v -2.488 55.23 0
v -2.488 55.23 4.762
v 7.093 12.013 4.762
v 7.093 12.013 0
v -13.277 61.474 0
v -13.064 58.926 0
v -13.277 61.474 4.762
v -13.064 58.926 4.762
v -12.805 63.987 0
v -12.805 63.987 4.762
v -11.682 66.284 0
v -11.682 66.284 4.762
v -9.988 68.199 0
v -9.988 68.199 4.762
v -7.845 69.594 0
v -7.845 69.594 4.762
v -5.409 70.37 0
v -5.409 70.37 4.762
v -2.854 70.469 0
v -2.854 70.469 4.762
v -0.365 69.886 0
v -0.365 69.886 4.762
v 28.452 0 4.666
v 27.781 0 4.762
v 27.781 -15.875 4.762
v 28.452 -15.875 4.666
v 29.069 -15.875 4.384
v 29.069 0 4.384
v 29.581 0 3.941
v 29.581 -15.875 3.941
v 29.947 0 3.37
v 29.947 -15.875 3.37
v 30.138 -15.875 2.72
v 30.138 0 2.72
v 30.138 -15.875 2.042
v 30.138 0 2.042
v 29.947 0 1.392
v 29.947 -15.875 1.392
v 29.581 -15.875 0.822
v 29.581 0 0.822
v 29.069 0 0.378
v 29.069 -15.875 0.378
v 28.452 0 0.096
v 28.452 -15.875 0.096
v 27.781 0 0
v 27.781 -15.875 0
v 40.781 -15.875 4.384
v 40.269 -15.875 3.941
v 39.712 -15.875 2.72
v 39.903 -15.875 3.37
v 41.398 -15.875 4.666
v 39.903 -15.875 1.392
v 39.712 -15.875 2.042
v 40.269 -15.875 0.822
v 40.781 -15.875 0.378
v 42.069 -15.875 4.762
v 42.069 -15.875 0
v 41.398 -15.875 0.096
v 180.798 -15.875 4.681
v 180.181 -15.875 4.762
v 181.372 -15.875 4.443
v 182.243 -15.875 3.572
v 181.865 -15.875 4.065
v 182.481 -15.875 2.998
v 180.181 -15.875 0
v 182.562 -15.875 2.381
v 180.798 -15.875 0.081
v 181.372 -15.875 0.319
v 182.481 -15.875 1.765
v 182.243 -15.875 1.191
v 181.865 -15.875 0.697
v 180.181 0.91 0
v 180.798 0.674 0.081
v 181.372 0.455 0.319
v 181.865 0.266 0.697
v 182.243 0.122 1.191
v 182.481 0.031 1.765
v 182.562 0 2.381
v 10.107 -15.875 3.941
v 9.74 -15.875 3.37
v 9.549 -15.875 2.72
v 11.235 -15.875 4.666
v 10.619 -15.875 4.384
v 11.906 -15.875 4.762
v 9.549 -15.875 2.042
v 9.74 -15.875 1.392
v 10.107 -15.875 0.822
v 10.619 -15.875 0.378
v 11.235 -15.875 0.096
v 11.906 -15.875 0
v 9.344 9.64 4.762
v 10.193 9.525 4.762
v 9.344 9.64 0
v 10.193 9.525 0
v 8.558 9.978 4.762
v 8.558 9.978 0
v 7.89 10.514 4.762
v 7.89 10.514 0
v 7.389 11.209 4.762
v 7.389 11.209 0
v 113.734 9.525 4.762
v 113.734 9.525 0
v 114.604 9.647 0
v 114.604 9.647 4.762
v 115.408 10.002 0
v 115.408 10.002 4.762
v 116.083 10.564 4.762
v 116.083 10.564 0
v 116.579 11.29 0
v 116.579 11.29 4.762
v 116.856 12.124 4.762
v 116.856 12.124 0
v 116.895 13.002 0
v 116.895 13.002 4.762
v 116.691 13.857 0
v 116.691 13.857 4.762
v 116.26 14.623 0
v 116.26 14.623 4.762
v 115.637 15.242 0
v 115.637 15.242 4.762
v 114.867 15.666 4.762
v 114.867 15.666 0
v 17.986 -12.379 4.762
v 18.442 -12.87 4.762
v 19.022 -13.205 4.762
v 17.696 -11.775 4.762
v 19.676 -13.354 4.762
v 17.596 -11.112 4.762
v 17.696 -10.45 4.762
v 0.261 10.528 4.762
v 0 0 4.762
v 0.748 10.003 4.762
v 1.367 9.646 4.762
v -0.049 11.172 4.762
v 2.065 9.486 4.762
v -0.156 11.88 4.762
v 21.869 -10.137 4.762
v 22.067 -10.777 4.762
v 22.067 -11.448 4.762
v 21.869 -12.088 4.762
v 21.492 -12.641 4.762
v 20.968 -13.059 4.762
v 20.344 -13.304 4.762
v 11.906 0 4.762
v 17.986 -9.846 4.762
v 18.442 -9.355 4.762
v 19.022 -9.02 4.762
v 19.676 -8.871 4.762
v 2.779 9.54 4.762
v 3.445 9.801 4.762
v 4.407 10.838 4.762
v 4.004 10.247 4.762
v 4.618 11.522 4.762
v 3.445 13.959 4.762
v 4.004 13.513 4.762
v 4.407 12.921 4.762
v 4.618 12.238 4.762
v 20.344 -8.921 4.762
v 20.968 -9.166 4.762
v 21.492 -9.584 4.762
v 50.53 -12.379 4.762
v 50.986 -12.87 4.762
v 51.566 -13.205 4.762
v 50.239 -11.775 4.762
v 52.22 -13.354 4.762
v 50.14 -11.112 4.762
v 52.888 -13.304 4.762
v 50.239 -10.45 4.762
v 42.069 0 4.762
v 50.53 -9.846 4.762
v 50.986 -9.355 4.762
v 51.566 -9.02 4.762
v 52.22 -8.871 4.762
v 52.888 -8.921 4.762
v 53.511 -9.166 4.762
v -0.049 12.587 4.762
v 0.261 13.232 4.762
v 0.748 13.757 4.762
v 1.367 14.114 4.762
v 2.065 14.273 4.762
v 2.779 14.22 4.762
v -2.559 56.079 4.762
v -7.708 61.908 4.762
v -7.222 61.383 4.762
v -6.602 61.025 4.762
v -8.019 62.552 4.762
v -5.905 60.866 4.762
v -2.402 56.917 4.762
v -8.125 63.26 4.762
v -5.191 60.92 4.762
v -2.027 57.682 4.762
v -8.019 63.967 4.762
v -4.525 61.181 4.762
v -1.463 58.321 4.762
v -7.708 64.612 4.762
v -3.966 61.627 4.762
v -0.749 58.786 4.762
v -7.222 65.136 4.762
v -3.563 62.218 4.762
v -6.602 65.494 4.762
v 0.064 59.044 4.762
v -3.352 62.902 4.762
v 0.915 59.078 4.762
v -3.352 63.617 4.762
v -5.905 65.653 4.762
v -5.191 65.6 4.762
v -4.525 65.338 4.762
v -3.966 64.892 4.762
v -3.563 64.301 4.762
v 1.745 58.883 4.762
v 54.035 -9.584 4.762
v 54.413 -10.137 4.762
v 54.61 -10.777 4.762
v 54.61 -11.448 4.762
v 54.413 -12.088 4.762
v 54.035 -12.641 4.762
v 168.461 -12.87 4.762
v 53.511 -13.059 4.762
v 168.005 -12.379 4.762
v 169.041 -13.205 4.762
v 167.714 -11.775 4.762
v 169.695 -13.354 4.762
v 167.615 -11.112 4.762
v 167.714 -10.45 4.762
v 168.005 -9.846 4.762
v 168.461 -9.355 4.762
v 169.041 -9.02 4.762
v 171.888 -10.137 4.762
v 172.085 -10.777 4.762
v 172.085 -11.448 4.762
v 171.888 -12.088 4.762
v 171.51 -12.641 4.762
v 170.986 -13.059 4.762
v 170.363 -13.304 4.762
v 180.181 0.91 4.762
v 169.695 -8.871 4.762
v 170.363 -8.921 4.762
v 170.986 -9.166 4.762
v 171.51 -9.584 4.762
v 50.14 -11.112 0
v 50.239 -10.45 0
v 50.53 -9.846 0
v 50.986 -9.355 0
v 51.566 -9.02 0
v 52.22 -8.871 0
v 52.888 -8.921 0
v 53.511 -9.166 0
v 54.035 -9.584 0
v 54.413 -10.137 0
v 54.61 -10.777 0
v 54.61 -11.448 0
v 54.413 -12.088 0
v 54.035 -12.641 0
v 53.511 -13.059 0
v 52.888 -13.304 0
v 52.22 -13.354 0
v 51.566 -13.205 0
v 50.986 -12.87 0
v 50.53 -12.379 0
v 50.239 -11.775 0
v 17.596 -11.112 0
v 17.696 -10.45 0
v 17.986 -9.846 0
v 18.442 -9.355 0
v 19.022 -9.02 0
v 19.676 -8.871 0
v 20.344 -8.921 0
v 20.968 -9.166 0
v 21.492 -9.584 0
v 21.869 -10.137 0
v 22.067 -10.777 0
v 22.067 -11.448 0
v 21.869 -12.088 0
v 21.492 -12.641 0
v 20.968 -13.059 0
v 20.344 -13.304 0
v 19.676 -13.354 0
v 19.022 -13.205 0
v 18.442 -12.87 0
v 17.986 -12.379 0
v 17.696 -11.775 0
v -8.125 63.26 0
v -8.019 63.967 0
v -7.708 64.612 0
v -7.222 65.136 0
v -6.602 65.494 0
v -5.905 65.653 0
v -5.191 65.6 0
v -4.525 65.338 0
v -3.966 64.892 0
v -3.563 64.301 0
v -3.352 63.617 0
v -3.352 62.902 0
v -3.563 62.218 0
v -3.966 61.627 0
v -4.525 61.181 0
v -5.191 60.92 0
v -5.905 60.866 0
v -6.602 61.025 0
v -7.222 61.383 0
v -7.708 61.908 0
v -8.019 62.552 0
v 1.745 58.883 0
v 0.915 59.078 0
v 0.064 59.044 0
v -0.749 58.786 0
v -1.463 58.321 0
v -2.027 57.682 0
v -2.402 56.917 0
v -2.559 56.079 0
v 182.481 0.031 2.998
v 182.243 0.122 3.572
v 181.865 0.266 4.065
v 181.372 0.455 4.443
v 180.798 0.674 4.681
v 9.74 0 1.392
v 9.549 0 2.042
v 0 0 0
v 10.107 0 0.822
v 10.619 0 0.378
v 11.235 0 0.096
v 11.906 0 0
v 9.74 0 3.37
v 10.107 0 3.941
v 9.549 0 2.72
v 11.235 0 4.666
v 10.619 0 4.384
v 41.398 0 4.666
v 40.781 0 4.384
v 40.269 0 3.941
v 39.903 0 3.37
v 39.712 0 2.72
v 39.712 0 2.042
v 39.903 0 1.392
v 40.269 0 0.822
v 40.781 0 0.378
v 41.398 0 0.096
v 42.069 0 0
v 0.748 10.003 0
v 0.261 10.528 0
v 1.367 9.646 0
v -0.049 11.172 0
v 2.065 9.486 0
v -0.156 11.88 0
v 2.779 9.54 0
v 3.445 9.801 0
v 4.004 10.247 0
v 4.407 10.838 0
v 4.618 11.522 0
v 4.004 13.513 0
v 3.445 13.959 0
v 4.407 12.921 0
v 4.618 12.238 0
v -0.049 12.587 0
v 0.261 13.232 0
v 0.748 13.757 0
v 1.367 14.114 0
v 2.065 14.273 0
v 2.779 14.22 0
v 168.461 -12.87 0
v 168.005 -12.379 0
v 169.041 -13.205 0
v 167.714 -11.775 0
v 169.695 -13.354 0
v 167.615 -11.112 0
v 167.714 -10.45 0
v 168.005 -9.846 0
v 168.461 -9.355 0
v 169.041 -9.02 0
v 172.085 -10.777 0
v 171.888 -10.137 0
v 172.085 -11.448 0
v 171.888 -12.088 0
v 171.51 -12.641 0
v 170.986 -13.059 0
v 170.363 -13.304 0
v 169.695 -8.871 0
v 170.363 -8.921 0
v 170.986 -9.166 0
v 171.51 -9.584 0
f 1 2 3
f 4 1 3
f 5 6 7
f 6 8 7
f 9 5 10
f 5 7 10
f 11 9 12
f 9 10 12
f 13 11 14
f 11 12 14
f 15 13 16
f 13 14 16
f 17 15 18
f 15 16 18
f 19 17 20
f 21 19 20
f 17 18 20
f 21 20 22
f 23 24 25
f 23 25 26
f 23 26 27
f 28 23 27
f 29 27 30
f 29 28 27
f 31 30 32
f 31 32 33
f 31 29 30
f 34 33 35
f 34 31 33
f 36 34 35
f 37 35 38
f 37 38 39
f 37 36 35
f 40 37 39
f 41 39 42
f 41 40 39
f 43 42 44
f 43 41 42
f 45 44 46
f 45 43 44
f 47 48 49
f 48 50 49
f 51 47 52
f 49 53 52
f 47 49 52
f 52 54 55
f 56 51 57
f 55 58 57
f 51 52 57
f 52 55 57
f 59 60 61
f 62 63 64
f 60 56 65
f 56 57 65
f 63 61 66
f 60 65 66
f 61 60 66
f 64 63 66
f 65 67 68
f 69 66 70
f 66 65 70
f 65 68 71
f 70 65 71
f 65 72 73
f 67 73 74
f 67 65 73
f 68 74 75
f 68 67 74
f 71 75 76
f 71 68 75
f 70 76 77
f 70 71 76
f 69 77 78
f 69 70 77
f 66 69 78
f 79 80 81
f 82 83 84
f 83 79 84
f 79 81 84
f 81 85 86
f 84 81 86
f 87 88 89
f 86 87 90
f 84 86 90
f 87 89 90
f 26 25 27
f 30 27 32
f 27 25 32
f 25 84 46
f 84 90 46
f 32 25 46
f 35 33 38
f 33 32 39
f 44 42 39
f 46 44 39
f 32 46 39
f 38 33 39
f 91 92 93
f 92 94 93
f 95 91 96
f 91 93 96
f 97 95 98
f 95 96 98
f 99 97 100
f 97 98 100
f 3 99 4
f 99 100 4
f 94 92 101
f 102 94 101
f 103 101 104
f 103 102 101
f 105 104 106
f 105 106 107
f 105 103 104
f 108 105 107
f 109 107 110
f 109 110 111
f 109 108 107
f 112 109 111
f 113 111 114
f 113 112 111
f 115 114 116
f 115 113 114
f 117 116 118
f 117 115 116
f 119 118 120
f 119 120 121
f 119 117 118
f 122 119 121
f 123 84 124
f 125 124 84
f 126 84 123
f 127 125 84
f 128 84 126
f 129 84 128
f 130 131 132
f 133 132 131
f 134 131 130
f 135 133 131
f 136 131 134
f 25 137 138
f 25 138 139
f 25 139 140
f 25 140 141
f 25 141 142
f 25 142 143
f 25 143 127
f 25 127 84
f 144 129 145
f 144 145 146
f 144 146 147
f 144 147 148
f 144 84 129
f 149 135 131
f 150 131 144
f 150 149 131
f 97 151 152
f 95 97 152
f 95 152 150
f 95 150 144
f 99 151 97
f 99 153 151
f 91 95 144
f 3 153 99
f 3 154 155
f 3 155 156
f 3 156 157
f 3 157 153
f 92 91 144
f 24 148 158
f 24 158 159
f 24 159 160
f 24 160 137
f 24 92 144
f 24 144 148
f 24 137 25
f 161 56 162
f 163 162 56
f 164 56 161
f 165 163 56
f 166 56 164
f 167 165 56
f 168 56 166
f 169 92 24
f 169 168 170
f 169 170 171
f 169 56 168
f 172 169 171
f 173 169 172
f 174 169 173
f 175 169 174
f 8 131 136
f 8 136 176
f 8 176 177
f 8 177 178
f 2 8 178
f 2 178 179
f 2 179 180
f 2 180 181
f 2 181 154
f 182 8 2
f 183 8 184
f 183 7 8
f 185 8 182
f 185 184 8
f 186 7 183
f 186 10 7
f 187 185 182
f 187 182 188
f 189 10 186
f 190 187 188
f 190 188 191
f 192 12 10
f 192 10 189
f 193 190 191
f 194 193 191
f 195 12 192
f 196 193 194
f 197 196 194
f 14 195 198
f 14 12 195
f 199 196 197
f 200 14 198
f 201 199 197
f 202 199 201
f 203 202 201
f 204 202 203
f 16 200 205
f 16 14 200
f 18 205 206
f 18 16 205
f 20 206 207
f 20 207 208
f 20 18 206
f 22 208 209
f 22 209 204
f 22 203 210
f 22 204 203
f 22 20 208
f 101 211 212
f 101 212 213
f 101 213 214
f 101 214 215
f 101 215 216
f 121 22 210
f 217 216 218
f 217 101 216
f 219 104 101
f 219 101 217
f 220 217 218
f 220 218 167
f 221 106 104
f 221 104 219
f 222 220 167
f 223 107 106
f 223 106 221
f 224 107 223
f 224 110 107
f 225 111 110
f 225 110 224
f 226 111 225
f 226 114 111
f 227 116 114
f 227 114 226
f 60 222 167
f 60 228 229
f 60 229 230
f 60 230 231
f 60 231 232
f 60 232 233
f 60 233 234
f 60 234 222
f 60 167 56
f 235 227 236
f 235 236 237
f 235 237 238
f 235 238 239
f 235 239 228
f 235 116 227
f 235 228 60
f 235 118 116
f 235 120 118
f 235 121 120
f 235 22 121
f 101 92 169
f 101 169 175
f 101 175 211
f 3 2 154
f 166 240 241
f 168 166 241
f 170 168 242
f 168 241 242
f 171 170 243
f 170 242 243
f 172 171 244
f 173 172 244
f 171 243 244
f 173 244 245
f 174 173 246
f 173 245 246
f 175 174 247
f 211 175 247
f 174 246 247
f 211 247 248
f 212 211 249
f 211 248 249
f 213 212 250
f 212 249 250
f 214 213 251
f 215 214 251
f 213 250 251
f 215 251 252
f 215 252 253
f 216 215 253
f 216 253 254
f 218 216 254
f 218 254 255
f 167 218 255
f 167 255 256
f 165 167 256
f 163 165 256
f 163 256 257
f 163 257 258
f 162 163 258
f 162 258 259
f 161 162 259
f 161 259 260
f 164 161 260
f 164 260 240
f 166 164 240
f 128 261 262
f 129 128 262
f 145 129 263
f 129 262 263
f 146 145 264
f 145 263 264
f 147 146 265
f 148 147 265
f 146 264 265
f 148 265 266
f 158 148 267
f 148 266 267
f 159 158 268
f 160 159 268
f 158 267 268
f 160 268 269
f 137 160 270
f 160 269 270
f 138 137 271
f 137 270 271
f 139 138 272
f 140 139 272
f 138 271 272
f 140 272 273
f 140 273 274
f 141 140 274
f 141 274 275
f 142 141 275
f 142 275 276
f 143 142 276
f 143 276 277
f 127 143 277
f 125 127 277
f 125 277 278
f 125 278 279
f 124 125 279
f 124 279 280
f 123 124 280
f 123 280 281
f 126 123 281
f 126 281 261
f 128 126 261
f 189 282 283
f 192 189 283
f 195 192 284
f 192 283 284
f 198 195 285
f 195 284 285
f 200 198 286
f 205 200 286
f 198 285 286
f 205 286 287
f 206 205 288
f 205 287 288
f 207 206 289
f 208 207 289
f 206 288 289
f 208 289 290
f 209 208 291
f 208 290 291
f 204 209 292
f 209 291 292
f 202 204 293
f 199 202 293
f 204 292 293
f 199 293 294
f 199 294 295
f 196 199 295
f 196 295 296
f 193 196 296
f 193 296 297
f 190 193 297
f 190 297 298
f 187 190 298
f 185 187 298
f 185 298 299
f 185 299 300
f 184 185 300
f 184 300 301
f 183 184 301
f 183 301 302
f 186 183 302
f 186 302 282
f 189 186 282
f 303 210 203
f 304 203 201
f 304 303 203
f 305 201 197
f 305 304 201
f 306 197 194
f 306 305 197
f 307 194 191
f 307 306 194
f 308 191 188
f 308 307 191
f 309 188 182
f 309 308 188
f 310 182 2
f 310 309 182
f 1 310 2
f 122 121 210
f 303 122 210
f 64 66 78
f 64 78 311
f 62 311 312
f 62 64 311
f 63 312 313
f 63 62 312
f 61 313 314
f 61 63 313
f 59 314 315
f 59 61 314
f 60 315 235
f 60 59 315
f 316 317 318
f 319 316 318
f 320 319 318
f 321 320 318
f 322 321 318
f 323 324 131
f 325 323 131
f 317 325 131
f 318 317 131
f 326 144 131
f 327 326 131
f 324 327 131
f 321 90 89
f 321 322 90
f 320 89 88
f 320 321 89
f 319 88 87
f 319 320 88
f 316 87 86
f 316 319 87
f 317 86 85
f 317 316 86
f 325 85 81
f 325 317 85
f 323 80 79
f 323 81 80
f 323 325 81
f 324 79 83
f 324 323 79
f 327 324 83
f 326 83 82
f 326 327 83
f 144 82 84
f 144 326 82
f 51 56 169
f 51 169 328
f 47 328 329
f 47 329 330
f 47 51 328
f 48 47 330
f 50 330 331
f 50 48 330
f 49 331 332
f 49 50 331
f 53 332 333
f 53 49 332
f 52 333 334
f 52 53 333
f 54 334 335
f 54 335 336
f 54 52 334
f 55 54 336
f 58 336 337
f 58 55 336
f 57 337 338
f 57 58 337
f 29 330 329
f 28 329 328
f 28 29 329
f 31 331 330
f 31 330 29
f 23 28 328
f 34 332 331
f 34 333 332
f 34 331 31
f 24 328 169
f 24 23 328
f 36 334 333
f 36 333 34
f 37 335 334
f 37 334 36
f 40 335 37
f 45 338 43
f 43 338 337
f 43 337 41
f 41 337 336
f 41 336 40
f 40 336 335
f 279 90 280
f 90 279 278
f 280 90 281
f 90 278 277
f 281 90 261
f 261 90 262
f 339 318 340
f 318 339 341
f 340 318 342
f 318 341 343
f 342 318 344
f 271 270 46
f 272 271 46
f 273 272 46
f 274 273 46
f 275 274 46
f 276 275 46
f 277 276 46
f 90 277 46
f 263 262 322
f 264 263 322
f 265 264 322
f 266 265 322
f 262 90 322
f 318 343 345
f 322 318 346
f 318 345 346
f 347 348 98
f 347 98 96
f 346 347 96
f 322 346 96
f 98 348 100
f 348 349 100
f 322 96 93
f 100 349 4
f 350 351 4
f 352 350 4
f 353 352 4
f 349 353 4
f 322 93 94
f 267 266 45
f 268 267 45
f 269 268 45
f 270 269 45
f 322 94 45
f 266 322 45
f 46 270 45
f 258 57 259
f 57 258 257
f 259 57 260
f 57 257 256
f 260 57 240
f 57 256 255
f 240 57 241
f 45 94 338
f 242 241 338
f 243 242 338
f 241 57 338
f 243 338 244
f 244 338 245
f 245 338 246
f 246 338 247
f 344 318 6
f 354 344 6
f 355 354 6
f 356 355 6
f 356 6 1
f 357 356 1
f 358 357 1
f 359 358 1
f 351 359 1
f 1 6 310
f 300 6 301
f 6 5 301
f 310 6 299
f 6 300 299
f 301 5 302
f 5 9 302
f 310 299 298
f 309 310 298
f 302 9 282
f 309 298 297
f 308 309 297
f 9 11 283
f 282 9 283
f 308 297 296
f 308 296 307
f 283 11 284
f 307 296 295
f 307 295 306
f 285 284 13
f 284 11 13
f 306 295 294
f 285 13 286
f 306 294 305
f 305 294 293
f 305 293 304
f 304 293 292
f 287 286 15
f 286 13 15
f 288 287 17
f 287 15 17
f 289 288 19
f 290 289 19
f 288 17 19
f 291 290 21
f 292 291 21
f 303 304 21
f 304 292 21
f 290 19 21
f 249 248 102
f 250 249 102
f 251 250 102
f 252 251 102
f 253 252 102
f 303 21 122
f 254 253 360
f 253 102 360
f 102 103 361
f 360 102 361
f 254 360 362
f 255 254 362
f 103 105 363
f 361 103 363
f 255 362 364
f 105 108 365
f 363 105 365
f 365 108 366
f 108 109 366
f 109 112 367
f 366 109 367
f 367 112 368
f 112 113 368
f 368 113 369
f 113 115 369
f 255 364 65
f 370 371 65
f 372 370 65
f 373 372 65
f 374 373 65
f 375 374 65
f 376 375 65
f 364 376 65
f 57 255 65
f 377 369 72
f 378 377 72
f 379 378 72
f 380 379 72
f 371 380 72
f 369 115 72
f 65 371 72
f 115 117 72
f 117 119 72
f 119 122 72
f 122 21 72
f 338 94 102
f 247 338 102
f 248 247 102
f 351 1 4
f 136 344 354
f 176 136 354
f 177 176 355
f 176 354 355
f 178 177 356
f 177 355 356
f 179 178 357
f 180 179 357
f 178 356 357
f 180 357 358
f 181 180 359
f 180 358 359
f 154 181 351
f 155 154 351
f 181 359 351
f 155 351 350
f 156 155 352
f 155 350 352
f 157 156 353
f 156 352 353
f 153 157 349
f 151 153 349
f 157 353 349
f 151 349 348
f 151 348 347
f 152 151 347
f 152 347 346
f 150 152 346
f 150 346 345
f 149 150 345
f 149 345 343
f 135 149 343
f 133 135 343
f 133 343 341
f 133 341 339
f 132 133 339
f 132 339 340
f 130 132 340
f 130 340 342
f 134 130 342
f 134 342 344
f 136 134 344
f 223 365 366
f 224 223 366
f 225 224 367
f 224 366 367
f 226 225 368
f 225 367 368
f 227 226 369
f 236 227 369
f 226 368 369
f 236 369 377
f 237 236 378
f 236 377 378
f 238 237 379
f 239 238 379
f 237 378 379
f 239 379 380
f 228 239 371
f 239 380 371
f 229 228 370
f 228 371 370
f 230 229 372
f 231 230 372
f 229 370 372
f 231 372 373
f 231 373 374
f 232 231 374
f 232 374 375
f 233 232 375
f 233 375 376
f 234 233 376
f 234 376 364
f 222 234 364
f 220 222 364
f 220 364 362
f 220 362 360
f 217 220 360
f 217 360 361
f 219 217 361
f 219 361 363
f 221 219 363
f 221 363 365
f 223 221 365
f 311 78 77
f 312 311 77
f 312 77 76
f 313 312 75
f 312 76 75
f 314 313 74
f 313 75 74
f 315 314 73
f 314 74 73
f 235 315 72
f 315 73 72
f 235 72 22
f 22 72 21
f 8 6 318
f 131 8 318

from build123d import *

# Parameters (mm, degrees)
BOSS_EXTRUDE1_DEPTH         = 4.7625
CUT_EXTRUDE1_DEPTH          = 198.884278841
FILLET1_R                   = 3.175
FILLET2_R                   = 9.525
F_12_0_189_DIAMETER_HOLE1_D = 4.8006
F_8_CLEARANCE_HOLE1_D       = 4.4958
FILLET3_RADIUS              = 2.38125
FILLET3_LENGTH              = 15.875
FILLET4_RADIUS              = 2.38125
FILLET4_LENGTH              = 15.875
FILLET5_RADIUS              = 2.38125
FILLET5_LENGTH              = 15.875
FILLET6_START               = -17
FILLET6_DEPTH               = 19


with BuildPart() as part:
    # Sketch1 → Boss-Extrude1 (new body)
    with BuildSketch(Plane.XY):
        Polygon((0, 0), (9.525, 0), (9.525, -15.875), (30.1625, -15.875), (30.1625, 0), (39.6875, 0), (39.6875, -15.875), (182.5625, -15.875), (182.5625, 0), (-16.893133293, 76.2), align=None)
    extrude(amount=BOSS_EXTRUDE1_DEPTH)

    # Sketch2 → Cut-Extrude1 (cut, through all)
    with BuildSketch(Plane.XY.offset(4.7625)):
        Polygon((7.644620712, 9.525), (130.941072945, 9.525), (-3.76442223, 60.987867019), align=None)
    extrude(amount=-CUT_EXTRUDE1_DEPTH, mode=Mode.SUBTRACT)

    # Fillet1
    fillet1_edges = [part.edges().sort_by_distance(p)[0] for p in [
        (7.644620712, 9.525, 2.38125),
        (-3.76442223, 60.987867019, 2.38125),
        (130.941072945, 9.525, 2.38125),
    ]]
    fillet(fillet1_edges, radius=FILLET1_R)

    # Fillet2
    fillet2_edges = [part.edges().sort_by_distance(p)[0] for p in [
        (-16.893133293, 76.2, 2.38125),
    ]]
    fillet(fillet2_edges, radius=FILLET2_R)

    # #12 (0.189) Diameter Hole1 (through all)
    with Locations(Plane.XY.offset(4.7625)):
        with Locations((-5.72515333, 63.259750533), (2.244424524, 11.879883041)):
            Hole(F_12_0_189_DIAMETER_HOLE1_D / 2)

    # #8 Clearance Hole1 (through all)
    with Locations(Plane.XY.offset(4.7625)):
        with Locations((19.84375, -11.1125), (52.3875, -11.1125), (169.8625, -11.1125)):
            Hole(F_8_CLEARANCE_HOLE1_D / 2)

    # Fillet3: full round fillet: the end face becomes a half cylinder, R = half its width
    fillet3_face = Plane((9.525, -7.9375, 2.38125), x_dir=(0, 1, 0), z_dir=(-1, 0, 0))  # on the end face: x along it, z out of the body
    fillet3_slab = fillet3_face.offset(-FILLET3_RADIUS / 2) * Box(FILLET3_LENGTH, 2 * FILLET3_RADIUS, FILLET3_RADIUS, mode=Mode.PRIVATE)  # the body's end, R deep
    fillet3_round = Plane((11.90625, -7.9375, 2.38125), x_dir=(-1, 0, 0), z_dir=(0, 1, 0)) * Cylinder(FILLET3_RADIUS, FILLET3_LENGTH, mode=Mode.PRIVATE)  # its axis R under the face
    add(fillet3_slab - fillet3_round, mode=Mode.SUBTRACT)

    # Fillet4: full round fillet: the end face becomes a half cylinder, R = half its width
    fillet4_face = Plane((30.1625, -7.9375, 2.38125), x_dir=(0, 1, 0), z_dir=(1, 0, 0))  # on the end face: x along it, z out of the body
    fillet4_slab = fillet4_face.offset(-FILLET4_RADIUS / 2) * Box(FILLET4_LENGTH, 2 * FILLET4_RADIUS, FILLET4_RADIUS, mode=Mode.PRIVATE)  # the body's end, R deep
    fillet4_round = Plane((27.78125, -7.9375, 2.38125), x_dir=(1, 0, 0), z_dir=(0, 1, 0)) * Cylinder(FILLET4_RADIUS, FILLET4_LENGTH, mode=Mode.PRIVATE)  # its axis R under the face
    add(fillet4_slab - fillet4_round, mode=Mode.SUBTRACT)

    # Fillet5: full round fillet: the end face becomes a half cylinder, R = half its width
    fillet5_face = Plane((39.6875, -7.9375, 2.38125), x_dir=(0, -1, 0), z_dir=(-1, 0, 0))  # on the end face: x along it, z out of the body
    fillet5_slab = fillet5_face.offset(-FILLET5_RADIUS / 2) * Box(FILLET5_LENGTH, 2 * FILLET5_RADIUS, FILLET5_RADIUS, mode=Mode.PRIVATE)  # the body's end, R deep
    fillet5_round = Plane((42.06875, -7.9375, 2.38125), x_dir=(-1, 0, 0), z_dir=(0, -1, 0)) * Cylinder(FILLET5_RADIUS, FILLET5_LENGTH, mode=Mode.PRIVATE)  # its axis R under the face
    add(fillet5_slab - fillet5_round, mode=Mode.SUBTRACT)

    # Fillet6: read off the stored shape, not the designer's step
    # Fillet6 outline → Fillet6 (cut)
    with BuildSketch(Plane(origin=(0, 0, 0), x_dir=(1, 0, 0), z_dir=(0, 1, 0)).offset(FILLET6_START)):
        with BuildLine():
            ThreePointArc((180.18125, 0), (181.865048023, -0.697451977), (182.5625, -2.38125))
            Line((182.5625, -2.38125), (182.5625, 0))
            Line((182.5625, 0), (180.18125, 0))
        make_face()
        with BuildLine():
            ThreePointArc((182.5625, -2.38125), (181.865048023, -4.065048023), (180.18125, -4.7625))
            Line((180.18125, -4.7625), (182.5625, -4.7625))
            Line((182.5625, -4.7625), (182.5625, -2.38125))
        make_face()
    extrude(amount=FILLET6_DEPTH, mode=Mode.SUBTRACT)


solid = part.part
